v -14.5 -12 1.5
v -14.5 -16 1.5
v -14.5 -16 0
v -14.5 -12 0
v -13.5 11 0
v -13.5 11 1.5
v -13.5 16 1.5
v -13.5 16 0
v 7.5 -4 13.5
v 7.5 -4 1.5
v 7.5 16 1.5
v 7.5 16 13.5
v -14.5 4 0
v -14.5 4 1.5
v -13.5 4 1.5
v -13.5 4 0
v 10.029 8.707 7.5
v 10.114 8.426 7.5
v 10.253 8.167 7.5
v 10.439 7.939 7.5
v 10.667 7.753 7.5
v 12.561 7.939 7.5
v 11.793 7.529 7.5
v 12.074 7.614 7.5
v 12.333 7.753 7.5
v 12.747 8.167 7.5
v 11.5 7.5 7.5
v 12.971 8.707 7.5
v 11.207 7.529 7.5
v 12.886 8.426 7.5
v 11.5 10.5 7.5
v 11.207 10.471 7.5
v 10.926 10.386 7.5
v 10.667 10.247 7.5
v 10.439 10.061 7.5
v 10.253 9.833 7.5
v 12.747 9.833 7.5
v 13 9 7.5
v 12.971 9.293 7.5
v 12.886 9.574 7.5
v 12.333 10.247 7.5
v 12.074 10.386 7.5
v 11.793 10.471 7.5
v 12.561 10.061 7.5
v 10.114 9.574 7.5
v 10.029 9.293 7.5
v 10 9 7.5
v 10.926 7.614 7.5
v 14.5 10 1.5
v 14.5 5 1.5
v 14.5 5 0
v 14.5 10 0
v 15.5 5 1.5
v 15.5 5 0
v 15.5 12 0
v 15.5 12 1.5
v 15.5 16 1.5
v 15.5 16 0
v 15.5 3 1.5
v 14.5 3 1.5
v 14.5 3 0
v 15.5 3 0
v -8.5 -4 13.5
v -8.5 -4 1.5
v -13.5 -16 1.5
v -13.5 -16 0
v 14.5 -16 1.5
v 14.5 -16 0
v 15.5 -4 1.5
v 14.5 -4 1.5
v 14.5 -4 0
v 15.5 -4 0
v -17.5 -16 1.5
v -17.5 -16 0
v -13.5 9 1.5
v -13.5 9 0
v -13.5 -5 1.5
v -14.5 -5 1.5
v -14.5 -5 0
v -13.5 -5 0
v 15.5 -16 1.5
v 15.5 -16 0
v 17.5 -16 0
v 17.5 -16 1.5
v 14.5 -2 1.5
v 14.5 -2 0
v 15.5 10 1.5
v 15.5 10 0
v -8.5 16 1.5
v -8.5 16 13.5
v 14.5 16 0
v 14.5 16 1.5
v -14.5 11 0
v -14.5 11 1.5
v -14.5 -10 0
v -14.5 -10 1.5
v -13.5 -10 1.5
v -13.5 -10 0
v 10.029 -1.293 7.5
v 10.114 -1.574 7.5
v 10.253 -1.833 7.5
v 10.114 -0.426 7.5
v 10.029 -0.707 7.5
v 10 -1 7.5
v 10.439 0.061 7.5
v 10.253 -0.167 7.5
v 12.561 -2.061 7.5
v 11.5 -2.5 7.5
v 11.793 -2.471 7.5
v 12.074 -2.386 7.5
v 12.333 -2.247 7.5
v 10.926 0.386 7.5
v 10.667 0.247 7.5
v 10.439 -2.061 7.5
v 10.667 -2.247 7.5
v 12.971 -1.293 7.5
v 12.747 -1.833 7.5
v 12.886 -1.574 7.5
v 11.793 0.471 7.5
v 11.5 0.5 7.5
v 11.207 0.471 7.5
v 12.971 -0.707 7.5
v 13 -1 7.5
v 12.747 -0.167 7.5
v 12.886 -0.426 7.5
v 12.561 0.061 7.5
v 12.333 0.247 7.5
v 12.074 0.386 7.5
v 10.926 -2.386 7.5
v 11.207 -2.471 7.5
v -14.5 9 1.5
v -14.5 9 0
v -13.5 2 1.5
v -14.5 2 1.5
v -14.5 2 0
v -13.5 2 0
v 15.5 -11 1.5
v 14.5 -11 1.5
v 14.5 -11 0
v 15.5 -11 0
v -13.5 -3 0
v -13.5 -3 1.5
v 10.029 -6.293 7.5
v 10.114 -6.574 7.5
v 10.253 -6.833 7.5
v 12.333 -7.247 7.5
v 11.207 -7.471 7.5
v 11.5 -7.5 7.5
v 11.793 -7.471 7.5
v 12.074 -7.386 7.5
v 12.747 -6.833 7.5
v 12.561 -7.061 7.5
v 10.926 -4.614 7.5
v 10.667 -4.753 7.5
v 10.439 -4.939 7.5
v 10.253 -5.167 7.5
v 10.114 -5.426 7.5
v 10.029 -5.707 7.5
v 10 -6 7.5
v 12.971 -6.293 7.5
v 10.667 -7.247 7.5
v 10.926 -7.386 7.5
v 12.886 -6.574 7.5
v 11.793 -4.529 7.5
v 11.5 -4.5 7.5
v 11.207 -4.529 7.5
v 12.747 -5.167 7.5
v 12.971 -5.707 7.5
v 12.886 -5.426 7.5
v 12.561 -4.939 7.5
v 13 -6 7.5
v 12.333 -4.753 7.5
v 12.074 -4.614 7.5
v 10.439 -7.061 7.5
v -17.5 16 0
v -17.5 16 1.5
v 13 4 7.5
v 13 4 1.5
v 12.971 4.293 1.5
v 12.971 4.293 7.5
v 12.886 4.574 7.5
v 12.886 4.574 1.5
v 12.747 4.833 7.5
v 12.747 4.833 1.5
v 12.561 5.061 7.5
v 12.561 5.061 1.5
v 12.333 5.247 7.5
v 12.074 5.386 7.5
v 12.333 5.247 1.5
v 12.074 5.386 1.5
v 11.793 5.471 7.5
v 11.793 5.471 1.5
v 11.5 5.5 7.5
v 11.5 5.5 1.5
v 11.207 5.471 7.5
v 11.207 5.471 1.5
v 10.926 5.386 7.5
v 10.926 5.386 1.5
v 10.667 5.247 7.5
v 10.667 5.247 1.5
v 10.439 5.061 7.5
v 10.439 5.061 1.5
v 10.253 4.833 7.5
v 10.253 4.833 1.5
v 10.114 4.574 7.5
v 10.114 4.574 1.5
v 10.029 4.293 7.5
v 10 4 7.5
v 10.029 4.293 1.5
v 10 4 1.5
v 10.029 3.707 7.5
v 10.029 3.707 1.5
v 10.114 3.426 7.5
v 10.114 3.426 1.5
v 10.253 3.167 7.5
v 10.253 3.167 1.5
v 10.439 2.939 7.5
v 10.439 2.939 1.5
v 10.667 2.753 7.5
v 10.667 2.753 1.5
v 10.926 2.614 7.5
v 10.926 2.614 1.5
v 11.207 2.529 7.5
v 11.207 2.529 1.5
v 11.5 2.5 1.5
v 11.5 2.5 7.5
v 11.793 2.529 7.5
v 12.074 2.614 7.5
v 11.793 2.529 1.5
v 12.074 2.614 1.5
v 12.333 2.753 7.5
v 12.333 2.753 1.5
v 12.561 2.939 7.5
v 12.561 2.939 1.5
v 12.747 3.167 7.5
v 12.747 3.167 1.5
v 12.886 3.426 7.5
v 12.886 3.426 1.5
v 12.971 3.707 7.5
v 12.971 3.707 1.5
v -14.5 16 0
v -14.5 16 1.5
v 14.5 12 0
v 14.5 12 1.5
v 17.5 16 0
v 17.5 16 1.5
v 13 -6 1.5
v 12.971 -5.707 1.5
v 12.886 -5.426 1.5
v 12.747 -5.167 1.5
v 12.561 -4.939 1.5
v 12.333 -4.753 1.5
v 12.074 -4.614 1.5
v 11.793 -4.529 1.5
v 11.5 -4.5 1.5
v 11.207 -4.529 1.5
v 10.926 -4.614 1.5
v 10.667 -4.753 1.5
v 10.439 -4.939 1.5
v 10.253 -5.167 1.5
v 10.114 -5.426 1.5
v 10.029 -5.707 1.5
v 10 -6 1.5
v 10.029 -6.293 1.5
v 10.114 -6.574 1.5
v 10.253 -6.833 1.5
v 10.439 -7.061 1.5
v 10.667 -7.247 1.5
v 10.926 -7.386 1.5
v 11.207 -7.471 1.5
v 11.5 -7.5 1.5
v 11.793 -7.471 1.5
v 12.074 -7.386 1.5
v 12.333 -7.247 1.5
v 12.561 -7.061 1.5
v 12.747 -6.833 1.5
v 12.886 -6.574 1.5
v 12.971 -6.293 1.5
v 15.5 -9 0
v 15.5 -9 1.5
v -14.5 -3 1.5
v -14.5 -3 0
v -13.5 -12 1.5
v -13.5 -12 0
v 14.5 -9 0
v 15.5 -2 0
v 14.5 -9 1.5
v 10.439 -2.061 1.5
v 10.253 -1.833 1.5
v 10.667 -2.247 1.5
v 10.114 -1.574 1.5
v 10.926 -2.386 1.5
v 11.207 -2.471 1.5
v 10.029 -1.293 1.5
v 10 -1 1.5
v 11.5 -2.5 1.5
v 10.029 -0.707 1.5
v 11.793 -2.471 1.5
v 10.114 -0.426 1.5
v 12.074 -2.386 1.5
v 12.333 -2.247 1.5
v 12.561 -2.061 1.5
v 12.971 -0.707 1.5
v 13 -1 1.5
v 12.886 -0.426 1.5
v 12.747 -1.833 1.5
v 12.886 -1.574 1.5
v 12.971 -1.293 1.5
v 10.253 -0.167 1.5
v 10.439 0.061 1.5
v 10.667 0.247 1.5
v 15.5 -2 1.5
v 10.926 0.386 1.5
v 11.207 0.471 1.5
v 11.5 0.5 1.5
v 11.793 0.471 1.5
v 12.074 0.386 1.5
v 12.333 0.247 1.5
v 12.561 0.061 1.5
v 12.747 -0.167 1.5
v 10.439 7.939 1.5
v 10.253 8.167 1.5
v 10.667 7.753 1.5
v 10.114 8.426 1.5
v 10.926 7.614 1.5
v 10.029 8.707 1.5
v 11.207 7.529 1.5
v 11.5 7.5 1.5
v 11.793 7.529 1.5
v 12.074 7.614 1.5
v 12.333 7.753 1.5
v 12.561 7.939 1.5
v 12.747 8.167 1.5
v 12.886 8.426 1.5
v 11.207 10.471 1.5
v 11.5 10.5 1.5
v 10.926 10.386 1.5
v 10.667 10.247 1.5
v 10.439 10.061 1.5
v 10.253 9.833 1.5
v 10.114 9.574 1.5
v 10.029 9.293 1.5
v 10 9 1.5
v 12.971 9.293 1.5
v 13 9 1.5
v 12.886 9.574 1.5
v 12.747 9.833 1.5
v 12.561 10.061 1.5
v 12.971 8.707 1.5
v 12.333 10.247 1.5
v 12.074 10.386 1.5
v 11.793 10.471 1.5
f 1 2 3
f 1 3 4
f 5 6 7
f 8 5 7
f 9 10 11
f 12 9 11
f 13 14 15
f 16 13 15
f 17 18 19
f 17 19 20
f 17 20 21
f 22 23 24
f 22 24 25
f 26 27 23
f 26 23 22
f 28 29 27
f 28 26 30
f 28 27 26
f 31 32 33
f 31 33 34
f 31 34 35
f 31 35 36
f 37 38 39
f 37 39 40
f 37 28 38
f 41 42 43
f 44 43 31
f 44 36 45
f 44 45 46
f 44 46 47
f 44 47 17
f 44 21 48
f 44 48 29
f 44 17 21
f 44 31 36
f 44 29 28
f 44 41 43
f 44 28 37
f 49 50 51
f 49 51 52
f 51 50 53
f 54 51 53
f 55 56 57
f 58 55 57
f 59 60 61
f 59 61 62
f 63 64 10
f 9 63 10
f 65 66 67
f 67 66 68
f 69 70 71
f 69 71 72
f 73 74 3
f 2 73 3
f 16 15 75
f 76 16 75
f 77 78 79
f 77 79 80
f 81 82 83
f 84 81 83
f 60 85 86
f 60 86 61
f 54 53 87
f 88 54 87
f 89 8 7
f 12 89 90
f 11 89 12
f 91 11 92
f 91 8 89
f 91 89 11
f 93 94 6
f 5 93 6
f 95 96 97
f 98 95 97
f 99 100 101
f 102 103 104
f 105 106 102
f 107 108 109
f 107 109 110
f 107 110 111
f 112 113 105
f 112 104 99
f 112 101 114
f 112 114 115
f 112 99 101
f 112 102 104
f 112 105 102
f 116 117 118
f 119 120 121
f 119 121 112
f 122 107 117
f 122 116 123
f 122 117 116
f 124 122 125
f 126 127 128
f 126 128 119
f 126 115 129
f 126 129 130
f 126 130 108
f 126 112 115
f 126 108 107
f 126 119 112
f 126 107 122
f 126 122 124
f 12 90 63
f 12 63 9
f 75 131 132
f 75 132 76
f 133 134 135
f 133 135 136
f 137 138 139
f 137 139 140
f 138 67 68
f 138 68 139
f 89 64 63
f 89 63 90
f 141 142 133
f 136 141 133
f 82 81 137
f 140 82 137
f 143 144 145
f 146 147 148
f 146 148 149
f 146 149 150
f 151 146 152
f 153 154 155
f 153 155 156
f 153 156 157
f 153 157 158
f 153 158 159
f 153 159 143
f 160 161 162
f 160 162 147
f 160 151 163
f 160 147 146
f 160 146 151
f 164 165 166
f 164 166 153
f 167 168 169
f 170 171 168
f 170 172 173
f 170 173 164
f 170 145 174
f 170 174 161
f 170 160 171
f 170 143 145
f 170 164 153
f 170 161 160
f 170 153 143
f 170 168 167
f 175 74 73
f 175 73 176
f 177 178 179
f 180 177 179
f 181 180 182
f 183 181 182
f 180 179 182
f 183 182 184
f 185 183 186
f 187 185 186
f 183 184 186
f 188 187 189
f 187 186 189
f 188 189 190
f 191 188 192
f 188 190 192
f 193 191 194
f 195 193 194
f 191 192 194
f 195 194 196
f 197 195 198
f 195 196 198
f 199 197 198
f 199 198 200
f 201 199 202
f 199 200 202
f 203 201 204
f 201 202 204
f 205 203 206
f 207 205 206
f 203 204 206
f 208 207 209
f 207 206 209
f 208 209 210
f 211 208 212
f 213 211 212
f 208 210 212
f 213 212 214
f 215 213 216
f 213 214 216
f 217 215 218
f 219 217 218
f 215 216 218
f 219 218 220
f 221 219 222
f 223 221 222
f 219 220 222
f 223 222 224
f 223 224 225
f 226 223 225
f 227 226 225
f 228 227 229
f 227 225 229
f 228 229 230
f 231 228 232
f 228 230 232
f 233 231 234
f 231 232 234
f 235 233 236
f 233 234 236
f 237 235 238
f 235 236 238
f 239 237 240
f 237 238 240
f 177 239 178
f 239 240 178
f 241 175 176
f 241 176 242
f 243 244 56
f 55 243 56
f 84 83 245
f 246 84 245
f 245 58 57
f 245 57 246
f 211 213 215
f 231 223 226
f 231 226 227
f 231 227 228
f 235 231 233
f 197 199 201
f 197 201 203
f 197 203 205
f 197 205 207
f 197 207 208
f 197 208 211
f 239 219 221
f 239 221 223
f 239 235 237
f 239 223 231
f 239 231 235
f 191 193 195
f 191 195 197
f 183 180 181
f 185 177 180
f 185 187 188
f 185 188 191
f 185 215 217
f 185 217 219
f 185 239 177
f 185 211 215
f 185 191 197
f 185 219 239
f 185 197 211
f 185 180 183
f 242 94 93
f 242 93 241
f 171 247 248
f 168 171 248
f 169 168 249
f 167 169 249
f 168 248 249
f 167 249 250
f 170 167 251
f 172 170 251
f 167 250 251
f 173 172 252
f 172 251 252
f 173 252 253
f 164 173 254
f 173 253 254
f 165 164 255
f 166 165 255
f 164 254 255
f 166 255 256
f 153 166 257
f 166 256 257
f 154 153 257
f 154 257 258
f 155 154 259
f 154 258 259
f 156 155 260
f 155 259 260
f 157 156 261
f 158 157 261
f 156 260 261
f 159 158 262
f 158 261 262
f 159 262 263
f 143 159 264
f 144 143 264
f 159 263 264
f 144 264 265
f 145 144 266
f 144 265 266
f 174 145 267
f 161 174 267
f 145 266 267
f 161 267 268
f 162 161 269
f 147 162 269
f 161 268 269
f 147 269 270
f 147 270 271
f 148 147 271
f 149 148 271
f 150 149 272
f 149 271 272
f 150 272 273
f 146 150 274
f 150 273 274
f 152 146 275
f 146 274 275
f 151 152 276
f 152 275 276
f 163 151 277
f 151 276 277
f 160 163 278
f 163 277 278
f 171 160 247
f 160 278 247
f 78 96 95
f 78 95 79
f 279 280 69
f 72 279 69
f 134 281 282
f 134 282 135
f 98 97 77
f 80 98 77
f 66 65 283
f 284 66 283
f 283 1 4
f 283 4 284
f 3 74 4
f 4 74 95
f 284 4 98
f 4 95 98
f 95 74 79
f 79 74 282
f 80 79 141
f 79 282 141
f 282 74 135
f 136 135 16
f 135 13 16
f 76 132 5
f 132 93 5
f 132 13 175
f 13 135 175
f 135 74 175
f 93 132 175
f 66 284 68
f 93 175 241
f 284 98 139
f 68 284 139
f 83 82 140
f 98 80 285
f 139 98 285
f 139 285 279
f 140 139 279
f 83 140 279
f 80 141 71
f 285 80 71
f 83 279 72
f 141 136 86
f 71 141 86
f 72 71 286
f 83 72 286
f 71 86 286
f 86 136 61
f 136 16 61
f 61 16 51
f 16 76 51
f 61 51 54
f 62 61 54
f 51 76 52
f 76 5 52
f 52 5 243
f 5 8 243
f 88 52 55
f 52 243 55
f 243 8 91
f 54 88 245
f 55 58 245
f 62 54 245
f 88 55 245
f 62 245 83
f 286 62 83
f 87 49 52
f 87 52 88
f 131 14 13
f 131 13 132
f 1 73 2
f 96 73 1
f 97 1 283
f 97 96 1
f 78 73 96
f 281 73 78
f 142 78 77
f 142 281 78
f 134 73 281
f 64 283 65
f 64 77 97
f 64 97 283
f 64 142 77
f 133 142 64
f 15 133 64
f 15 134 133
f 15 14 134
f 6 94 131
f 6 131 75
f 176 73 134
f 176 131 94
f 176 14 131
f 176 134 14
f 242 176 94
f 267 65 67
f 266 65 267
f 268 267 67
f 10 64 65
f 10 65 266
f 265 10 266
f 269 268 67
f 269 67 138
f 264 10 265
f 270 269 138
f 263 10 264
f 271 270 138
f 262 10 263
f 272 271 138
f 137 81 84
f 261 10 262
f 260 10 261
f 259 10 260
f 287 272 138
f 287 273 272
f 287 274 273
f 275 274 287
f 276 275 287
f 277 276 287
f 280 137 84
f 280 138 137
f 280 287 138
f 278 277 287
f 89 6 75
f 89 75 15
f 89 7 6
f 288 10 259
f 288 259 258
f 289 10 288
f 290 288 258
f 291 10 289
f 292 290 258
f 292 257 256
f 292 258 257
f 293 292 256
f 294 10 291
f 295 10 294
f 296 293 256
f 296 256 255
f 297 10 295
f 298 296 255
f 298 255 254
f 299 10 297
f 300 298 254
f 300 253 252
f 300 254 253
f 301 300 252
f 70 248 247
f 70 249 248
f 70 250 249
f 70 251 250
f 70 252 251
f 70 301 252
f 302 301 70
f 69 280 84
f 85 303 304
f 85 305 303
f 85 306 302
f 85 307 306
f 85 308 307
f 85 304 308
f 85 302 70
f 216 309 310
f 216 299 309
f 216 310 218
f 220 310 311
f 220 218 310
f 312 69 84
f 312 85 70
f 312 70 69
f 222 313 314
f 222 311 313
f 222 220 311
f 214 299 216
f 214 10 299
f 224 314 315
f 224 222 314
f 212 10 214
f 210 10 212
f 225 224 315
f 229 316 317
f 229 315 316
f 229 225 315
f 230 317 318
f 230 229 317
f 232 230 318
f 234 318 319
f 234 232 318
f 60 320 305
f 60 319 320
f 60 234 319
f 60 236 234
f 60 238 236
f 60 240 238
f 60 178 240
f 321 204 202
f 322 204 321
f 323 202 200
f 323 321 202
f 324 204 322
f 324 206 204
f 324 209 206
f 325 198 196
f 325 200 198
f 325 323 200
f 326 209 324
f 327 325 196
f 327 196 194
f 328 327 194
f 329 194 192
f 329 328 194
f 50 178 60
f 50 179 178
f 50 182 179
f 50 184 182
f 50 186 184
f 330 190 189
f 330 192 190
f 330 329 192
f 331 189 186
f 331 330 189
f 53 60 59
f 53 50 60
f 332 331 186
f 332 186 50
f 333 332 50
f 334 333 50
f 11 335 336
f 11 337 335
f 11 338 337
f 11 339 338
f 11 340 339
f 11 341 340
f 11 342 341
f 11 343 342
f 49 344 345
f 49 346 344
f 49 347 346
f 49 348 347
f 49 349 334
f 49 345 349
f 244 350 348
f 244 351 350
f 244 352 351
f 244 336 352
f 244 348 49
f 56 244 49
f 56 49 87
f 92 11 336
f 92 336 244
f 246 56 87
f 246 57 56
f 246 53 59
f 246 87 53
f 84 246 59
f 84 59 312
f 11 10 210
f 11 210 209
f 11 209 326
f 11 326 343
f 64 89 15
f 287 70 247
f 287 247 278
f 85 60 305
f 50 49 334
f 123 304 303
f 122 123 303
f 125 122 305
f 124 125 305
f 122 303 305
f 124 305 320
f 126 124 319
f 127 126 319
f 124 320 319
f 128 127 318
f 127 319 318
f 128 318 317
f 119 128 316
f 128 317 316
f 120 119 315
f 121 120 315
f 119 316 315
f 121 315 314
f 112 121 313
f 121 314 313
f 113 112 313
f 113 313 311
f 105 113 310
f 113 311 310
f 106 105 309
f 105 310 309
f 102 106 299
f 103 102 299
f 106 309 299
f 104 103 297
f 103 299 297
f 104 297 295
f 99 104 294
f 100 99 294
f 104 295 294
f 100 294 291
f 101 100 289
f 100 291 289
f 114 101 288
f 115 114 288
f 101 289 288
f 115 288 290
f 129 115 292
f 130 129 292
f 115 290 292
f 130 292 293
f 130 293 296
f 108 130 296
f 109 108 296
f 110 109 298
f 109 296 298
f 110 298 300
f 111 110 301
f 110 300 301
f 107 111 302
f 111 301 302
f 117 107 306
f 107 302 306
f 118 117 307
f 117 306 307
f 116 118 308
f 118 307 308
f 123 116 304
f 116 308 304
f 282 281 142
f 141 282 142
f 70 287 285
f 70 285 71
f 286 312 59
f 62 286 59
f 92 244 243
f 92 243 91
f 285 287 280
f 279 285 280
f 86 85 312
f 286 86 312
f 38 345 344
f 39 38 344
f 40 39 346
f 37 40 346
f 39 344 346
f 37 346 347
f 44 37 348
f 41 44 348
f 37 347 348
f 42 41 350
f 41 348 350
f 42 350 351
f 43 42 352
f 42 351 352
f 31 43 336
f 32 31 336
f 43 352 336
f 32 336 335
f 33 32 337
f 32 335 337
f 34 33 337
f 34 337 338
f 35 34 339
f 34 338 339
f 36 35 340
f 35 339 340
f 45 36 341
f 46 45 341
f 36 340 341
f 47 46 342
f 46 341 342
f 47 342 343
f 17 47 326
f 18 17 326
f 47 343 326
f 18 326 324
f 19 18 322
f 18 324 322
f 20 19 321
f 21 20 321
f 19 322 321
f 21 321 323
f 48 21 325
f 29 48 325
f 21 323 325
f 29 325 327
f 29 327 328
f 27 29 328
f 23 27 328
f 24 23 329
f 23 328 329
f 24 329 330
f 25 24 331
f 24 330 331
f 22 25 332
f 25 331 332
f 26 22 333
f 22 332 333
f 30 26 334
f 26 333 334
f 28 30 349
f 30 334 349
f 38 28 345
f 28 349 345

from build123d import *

# Parameters (mm, degrees)
F0_W     = 35
F0_H     = 32
F1_DEPTH = 1.5
F2_W     = 16
F2_H     = 20
F3_DEPTH = 12
F4_R     = 1.5
F5_DEPTH = 6
F6_W     = 1
F6_H     = 5
F7_DEPTH = 1.5


with BuildPart() as f1:
    # F0 (on Top) → F1 (new body)
    with BuildSketch(Plane.XY):
        Rectangle(F0_W, F0_H)
    extrude(amount=F1_DEPTH)

    # F2 (on face) → F3 (join)
    with BuildSketch(Plane.XY.offset(1.5)):
        with Locations((-0.5, 6)):
            Rectangle(F2_W, F2_H)
    extrude(amount=F3_DEPTH)

    # F4 (on face) → F5 (join)
    with BuildSketch(Plane.XY.offset(1.5)):
        with Locations((11.5, 9)):
            Circle(F4_R)
        with Locations((11.5, 4)):
            Circle(F4_R)
        with Locations((11.5, -1)):
            Circle(F4_R)
        with Locations((11.5, -6)):
            Circle(F4_R)
    extrude(amount=F5_DEPTH)

    # F6 (on face) → F7 (cut, through all)
    with BuildSketch(Plane.XY.offset(1.5)):
        with Locations((-14, 13.5)):
            Rectangle(F6_W, F6_H)
        with Locations((-14, 6.5)):
            Rectangle(F6_W, F6_H)
        with Locations((-14, -0.5)):
            Rectangle(F6_W, F6_H)
        with Locations((-14, -7.5)):
            Rectangle(F6_W, F6_H)
        with Locations((-14, -14.5)):
            Rectangle(F6_W, F6_H)
        with Locations((15, -13.5)):
            Rectangle(F6_W, F6_H)
        with Locations((15, -6.5)):
            Rectangle(F6_W, F6_H)
        with Locations((15, 0.5)):
            Rectangle(F6_W, F6_H)
        with Locations((15, 7.5)):
            Rectangle(F6_W, F6_H)
        with Locations((15, 14.5)):
            Rectangle(F6_W, F6_H)
    extrude(amount=-F7_DEPTH, mode=Mode.SUBTRACT)


solid = f1.part
